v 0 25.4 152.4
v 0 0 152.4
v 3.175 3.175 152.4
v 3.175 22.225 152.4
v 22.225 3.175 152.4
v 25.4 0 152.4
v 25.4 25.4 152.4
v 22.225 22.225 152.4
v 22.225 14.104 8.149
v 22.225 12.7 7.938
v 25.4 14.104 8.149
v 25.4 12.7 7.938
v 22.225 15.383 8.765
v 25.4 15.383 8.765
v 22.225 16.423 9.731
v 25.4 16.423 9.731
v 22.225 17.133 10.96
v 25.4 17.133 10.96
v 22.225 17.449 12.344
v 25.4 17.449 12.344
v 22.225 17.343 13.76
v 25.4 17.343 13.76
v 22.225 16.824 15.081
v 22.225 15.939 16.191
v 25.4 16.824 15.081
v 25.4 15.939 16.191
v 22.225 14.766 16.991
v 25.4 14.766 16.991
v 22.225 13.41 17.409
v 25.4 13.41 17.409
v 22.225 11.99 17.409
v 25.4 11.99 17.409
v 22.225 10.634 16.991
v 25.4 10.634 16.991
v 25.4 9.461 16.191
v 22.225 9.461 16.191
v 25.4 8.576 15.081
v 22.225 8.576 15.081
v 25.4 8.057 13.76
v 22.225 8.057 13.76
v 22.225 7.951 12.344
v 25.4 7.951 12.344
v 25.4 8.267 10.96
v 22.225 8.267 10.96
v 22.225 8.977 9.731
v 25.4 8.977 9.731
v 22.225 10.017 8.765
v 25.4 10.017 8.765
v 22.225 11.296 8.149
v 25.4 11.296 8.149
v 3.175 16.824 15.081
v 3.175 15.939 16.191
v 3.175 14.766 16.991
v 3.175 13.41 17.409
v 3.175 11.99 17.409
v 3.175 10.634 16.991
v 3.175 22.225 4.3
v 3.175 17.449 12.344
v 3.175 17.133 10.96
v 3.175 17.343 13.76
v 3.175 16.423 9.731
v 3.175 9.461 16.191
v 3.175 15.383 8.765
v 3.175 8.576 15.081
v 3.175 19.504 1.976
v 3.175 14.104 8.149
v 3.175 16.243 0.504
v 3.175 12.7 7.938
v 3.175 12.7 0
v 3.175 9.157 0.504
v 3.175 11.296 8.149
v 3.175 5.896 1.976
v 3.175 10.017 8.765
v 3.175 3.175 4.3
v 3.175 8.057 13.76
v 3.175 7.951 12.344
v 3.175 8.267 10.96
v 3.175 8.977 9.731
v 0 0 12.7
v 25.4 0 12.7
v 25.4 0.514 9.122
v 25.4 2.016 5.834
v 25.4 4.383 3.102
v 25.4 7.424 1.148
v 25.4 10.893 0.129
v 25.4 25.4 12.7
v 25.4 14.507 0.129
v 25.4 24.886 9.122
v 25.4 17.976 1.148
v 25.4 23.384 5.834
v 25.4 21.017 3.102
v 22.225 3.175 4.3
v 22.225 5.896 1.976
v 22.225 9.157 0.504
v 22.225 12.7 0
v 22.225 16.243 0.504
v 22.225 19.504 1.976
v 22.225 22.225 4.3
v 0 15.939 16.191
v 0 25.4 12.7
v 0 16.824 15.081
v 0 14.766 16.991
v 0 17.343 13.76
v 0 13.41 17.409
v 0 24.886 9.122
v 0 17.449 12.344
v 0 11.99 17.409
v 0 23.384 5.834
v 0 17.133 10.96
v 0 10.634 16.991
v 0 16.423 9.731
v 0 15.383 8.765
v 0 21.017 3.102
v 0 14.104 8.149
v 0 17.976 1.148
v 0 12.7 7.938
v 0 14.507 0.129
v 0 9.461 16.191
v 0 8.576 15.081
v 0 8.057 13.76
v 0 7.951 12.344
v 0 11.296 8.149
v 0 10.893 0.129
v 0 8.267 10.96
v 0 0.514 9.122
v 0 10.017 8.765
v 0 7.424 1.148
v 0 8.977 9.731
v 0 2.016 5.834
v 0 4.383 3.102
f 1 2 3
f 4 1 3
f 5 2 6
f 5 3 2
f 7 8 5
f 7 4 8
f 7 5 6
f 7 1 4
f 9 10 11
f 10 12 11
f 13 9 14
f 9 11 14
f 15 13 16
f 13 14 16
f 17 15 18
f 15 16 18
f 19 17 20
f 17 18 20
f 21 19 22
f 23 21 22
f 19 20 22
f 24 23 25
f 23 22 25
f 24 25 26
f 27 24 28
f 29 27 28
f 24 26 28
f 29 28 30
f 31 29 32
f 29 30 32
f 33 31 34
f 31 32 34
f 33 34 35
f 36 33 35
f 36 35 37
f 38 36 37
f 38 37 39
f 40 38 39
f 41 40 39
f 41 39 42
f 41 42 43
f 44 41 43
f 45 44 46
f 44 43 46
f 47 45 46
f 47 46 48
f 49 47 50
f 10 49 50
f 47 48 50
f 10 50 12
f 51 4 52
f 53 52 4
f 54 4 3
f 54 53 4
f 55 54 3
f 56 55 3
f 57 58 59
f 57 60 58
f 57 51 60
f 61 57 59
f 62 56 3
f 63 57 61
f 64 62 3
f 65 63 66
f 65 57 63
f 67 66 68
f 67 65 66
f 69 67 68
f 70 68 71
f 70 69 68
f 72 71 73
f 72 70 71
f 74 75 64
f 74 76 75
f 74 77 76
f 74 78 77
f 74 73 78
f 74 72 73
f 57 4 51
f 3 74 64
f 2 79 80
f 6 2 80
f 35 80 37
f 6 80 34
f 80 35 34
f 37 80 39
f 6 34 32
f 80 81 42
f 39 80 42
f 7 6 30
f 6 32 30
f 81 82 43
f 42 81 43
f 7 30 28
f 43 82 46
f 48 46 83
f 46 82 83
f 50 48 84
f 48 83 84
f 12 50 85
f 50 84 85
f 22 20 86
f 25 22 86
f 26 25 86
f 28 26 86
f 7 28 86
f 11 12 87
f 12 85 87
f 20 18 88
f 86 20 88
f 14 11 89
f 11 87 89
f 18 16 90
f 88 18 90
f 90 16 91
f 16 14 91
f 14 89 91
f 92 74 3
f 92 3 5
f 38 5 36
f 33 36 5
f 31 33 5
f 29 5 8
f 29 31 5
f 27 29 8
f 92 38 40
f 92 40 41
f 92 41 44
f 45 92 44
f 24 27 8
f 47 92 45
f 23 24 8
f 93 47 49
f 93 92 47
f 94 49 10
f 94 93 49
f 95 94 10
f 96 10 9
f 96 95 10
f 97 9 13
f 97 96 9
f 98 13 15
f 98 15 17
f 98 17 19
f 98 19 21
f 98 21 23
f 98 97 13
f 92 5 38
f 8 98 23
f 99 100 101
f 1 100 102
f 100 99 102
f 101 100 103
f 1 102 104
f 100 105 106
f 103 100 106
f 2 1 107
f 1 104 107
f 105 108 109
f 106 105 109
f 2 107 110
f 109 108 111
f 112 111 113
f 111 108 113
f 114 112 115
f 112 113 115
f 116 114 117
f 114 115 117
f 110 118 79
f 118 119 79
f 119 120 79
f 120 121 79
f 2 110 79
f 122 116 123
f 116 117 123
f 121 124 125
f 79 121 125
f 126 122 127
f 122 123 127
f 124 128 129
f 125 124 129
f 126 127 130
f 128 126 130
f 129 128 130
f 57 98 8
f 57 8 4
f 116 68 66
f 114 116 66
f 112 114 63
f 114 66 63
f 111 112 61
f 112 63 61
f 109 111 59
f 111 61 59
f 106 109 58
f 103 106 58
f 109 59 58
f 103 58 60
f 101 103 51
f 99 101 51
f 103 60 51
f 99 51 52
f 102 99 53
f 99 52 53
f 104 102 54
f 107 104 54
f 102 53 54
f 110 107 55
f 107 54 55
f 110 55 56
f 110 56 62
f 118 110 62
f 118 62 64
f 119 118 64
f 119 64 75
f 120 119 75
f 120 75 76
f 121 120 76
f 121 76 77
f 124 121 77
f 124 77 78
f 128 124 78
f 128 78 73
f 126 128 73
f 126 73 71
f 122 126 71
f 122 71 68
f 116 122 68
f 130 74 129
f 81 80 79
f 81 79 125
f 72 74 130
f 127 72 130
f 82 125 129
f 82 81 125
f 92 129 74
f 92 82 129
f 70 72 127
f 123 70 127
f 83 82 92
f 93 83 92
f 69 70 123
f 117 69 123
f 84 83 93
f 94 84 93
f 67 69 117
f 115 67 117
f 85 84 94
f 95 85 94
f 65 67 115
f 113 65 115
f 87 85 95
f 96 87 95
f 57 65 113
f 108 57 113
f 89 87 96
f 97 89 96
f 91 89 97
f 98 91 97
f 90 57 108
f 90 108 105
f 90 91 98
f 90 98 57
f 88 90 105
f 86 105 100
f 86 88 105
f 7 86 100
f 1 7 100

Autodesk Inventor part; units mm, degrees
ref_plane "YZ Plane" through (0, 0, 0) normal (1, 0, 0) x (0, 1, 0)
ref_plane "XZ Plane" through (0, 0, 0) normal (0, 1, 0) x (-1, 0, 0)
ref_plane "XY Plane" through (0, 0, 0) normal (0, 0, 1) x (1, 0, 0)
sketch "Sketch1" plane through (0, 0, 0) normal (0, 0, 1) x (1, 0, 0)
  line L0 (0, 0) -> (25.4, 0)
  line L1 (25.4, 0) -> (25.4, 25.4)
  line L2 (25.4, 25.4) -> (0, 25.4)
  line L3 (0, 25.4) -> (0, 0)
  line L4 (3.175, 3.175) -> (22.225, 3.175)
  line L5 (22.225, 3.175) -> (22.225, 22.225)
  line L6 (22.225, 22.225) -> (3.175, 22.225)
  line L7 (3.175, 22.225) -> (3.175, 3.175)
  dimension "d0" = 25.4
  dimension "d1" = 25.4
  dimension "d2" = 3.175
  dimension "d3" = 3.175
  dimension "d4" = 3.175
  dimension "d5" = 3.175
extrude "Extrusion1" add sketch "Sketch1" along normal blind 152.4
sketch "Sketch2" plane through (25.4, 0, 0) normal (1, 0, 0) x (0, 0, -1)
  line L0 (-152.4, 25.4) -> (-152.4, 0) projected
  line L1 (0, 0) -> (-152.4, 0) projected
  line L2 (0, 0) -> (0, 25.4) projected
  line L3 (0, 25.4) -> (-152.4, 25.4) projected
  circle A0 centre (-12.7, 12.7) radius 4.7625
  arc A1 (-12.7, 0) -> (-12.7, 25.4) centre (-12.7, 12.7) ccw
  dimension "d8" = 9.525
  dimension "d9" = 12.7
  dimension "d10" = 12.7
extrude "Extrusion2" cut sketch "Sketch2" against normal blind 25.4 contours L3 L2 A1 | A1 L2 L1 | A0
equation "\"d2\" = d5"
equation "\"d3\" = d2"
equation "\"d5\" = d4"
equation "\"d10\" = d9"
properties part number "8 ball top arm tube"
